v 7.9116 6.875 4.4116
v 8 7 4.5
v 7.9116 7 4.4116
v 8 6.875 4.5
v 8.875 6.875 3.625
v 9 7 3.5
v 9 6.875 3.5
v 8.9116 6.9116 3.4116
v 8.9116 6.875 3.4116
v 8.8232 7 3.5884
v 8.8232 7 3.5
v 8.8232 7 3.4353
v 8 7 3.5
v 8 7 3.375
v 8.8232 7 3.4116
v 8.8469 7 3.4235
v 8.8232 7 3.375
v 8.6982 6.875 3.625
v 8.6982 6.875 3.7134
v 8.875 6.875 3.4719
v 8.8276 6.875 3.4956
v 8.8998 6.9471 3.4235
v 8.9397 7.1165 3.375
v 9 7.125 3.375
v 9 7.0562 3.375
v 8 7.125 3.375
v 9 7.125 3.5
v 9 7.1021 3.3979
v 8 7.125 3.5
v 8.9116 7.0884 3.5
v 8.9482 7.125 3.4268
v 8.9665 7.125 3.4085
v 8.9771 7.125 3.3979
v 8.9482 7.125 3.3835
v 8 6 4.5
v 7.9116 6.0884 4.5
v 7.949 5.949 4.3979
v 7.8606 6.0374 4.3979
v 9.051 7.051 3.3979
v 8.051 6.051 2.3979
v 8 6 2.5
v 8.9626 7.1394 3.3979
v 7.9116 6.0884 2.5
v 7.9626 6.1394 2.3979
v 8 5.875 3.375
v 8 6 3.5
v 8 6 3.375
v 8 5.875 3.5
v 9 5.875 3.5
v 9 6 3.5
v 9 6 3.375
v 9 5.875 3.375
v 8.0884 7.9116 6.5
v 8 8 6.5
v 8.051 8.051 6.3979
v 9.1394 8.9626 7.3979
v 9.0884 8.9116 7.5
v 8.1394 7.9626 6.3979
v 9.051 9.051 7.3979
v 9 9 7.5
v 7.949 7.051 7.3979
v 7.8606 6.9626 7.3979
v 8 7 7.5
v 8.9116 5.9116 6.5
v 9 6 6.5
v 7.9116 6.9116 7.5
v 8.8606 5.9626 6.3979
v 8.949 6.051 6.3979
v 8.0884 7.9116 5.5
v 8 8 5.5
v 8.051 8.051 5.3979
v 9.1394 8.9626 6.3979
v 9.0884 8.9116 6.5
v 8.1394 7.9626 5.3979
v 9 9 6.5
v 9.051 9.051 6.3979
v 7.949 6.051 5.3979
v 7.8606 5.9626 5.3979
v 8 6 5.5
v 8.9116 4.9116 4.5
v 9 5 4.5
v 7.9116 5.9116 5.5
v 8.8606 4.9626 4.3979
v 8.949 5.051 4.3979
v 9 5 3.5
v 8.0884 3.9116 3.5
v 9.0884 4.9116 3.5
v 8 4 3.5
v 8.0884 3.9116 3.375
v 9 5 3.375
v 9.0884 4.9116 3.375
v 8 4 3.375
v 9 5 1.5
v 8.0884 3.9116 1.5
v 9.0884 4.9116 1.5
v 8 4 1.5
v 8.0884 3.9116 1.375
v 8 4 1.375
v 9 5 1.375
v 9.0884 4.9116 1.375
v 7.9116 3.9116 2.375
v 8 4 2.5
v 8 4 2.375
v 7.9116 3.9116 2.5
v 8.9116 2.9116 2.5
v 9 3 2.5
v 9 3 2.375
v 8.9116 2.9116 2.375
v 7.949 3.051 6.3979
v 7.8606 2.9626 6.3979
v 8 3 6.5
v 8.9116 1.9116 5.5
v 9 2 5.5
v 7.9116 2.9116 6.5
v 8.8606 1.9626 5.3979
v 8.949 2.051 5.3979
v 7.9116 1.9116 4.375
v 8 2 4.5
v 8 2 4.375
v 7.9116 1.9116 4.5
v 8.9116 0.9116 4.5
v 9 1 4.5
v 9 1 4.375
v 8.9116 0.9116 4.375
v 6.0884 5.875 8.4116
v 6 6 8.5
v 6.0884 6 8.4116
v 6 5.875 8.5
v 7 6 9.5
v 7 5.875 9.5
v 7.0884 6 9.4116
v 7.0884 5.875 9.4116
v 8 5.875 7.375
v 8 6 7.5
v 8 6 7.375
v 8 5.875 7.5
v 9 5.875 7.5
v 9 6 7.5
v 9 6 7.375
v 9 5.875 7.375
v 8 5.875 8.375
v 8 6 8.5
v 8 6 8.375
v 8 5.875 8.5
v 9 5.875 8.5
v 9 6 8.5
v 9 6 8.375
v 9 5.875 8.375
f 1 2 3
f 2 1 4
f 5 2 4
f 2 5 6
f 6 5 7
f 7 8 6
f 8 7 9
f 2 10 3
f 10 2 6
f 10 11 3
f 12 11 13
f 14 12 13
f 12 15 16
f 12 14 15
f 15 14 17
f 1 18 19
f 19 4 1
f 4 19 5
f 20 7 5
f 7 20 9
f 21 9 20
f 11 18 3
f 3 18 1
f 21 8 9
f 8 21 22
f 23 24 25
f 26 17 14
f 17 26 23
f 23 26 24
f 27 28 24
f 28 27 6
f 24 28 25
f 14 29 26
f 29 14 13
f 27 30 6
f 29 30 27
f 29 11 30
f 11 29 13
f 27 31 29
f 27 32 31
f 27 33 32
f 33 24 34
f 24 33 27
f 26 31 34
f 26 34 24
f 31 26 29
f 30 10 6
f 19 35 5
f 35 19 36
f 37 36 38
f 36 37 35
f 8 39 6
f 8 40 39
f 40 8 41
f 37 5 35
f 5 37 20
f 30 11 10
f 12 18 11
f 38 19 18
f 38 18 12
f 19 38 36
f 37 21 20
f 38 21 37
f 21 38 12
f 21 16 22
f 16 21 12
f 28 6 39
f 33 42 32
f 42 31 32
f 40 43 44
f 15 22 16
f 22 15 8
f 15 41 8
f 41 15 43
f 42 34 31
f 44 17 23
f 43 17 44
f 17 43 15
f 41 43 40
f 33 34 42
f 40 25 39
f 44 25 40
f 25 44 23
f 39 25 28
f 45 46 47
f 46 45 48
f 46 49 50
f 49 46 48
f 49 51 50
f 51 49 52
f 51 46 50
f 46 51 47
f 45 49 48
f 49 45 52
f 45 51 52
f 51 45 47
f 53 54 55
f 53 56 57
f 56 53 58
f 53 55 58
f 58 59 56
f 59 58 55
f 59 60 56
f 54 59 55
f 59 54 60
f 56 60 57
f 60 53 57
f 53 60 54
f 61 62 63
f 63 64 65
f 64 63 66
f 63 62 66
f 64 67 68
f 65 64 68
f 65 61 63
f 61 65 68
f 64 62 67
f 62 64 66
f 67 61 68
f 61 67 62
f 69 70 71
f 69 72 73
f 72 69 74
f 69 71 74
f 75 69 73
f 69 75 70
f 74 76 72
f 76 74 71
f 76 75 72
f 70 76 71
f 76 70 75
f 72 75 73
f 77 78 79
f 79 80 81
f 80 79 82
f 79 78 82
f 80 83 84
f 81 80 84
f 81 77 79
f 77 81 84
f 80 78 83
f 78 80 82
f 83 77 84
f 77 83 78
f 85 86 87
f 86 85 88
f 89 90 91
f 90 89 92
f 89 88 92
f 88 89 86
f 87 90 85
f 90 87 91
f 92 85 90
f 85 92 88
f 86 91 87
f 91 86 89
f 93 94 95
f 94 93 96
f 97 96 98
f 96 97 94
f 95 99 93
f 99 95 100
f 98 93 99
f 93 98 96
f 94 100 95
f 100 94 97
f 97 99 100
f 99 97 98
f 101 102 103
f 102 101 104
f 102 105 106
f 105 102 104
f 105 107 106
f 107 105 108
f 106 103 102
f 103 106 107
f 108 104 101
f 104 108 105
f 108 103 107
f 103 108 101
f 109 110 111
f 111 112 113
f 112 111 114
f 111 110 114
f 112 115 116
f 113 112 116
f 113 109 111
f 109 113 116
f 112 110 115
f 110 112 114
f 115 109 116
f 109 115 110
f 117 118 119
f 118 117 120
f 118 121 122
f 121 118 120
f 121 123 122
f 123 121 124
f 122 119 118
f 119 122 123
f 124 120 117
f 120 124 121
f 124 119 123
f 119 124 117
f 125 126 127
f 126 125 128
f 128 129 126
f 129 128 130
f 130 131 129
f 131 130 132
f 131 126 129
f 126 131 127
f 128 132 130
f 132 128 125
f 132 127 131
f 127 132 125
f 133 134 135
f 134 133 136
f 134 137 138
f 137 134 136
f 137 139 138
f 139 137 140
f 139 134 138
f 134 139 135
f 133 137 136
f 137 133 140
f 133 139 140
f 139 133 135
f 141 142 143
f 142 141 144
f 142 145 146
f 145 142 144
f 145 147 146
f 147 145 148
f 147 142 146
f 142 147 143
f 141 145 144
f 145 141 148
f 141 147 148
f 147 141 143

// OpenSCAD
translate(v = [-0.5, -0.5, 0]) {
	/*Shell 0*/
	union() {
		%/*Nodes shell 0*/
		union();
		/*Edges shell 0*/
		union();
	}
	/*Shell 1*/
	union() {
		%/*Nodes shell 1*/
		union();
		/*Edges shell 1*/
		union();
	}
	/*Shell 2*/
	union() {
		%/*Nodes shell 2*/
		union();
		/*Edges shell 2*/
		union();
	}
	/*Shell 3*/
	union() {
		%/*Nodes shell 3*/
		union();
		/*Edges shell 3*/
		union();
	}
	/*Shell 4*/
	union() {
		%/*Nodes shell 4*/
		union();
		/*Edges shell 4*/
		union();
	}
	/*Shell 5*/
	union() {
		%/*Nodes shell 5*/
		union() {
			/*Node thing.chamber[0].thingy.v1*/
			color(alpha = 0.1, c = "black") {
				translate(v = [1, -3, 6]) {
					cube(size = [1, 1, 1]);
				}
			}
			/*Node thing.chamber[0].thingy.v10*/
			color(alpha = 0.1, c = "black") {
				translate(v = [2, -3, 6]) {
					cube(size = [1, 1, 1]);
				}
			}
			/*Node thing.chamber[0].thingy.v11*/
			color(alpha = 0.1, c = "black") {
				translate(v = [4, -3, 6]) {
					cube(size = [1, 1, 1]);
				}
			}
			/*Node thing.chamber[0].thingy.v2*/
			color(alpha = 0.1, c = "black") {
				translate(v = [4, -2, 6]) {
					cube(size = [1, 1, 1]);
				}
			}
			/*Node thing.chamber[0].thingy.v3*/
			color(alpha = 0.1, c = "black") {
				translate(v = [0, -3, 6]) {
					cube(size = [1, 1, 1]);
				}
			}
			/*Node thing.chamber[0].thingy.v5*/
			color(alpha = 0.1, c = "black") {
				translate(v = [-1, -3, 6]) {
					cube(size = [1, 1, 1]);
				}
			}
			/*Node thing.chamber[0].thingy.v7*/
			color(alpha = 0.1, c = "black") {
				translate(v = [3, -2, 6]) {
					cube(size = [1, 1, 1]);
				}
			}
			/*Node thing.chamber[0].thingy.v9*/
			color(alpha = 0.1, c = "black") {
				translate(v = [-2, -3, 6]) {
					cube(size = [1, 1, 1]);
				}
			}
			/*Node thing.chamber[1].thingy.v1*/
			color(alpha = 0.1, c = "black") {
				translate(v = [0, -4, 6]) {
					cube(size = [1, 1, 1]);
				}
			}
			/*Node thing.chamber[1].thingy.v11*/
			color(alpha = 0.1, c = "black") {
				translate(v = [3, -3, 6]) {
					cube(size = [1, 1, 1]);
				}
			}
			/*Node thing.chamber[2].thingy.v1*/
			color(alpha = 0.1, c = "black") {
				translate(v = [0, -6, 4]) {
					cube(size = [1, 1, 1]);
				}
			}
			/*Node thing.chamber[2].thingy.v11*/
			color(alpha = 0.1, c = "black") {
				translate(v = [5, -4, 6]) {
					cube(size = [1, 1, 1]);
				}
			}
			/*Node thing.chamber[3].thingy.v1*/
			color(alpha = 0.1, c = "black") {
				translate(v = [1, -4, 6]) {
					cube(size = [1, 1, 1]);
				}
			}
			/*Node thing.chamber[3].thingy.v11*/
			color(alpha = 0.1, c = "black") {
				translate(v = [3, -5, 6]) {
					cube(size = [1, 1, 1]);
				}
			}
			/*Node thing.chamber[3].thingy.v5*/
			color(alpha = 0.1, c = "black") {
				translate(v = [-2, -6, 6]) {
					cube(size = [1, 1, 1]);
				}
			}
			/*Node thing.chamber[3].thingy.v7*/
			color(alpha = 0.1, c = "black") {
				translate(v = [4, -4, 6]) {
					cube(size = [1, 1, 1]);
				}
			}
			/*Node thing.chamber[3].thingy.v9*/
			color(alpha = 0.1, c = "black") {
				translate(v = [6, -6, 6]) {
					cube(size = [1, 1, 1]);
				}
			}
			/*Node $_22__5*/
			color(alpha = 0.1, c = "lightblue") {
				translate(v = [6, -3, 6]) {
					cube(size = [1, 1, 1]);
				}
			}
			/*Node $_16__5*/
			color(alpha = 0.1, c = "lightblue") {
				translate(v = [3, -6, 4]) {
					cube(size = [1, 1, 1]);
				}
			}
			/*Node $_9__5*/
			color(alpha = 0.1, c = "lightblue") {
				translate(v = [5, -2, 6]) {
					cube(size = [1, 1, 1]);
				}
			}
			/*Node $_26__5*/
			color(alpha = 0.1, c = "lightblue") {
				translate(v = [6, -5, 6]) {
					cube(size = [1, 1, 1]);
				}
			}
			/*Node $_3__5*/
			color(alpha = 0.1, c = "lightblue") {
				translate(v = [-1, -4, 6]) {
					cube(size = [1, 1, 1]);
				}
			}
			/*Node $_17__5*/
			color(alpha = 0.1, c = "lightblue") {
				translate(v = [3, -4, 6]) {
					cube(size = [1, 1, 1]);
				}
			}
			/*Node $_84__5*/
			color(alpha = 0.1, c = "lightblue") {
				translate(v = [6, -2, 6]) {
					cube(size = [1, 1, 1]);
				}
			}
			/*Node $_5__5*/
			color(alpha = 0.1, c = "lightblue") {
				translate(v = [2, -6, 6]) {
					cube(size = [1, 1, 1]);
				}
			}
			/*Node $_8__5*/
			color(alpha = 0.1, c = "lightblue") {
				translate(v = [5, -3, 6]) {
					cube(size = [1, 1, 1]);
				}
			}
			/*Node $_83__5*/
			color(alpha = 0.1, c = "lightblue") {
				translate(v = [0, -5, 6]) {
					cube(size = [1, 1, 1]);
				}
			}
			/*Node $_12__5*/
			color(alpha = 0.1, c = "lightblue") {
				translate(v = [1, -2, 6]) {
					cube(size = [1, 1, 1]);
				}
			}
			/*Node $_2__5*/
			color(alpha = 0.1, c = "lightblue") {
				translate(v = [6, -5, 4]) {
					cube(size = [1, 1, 1]);
				}
			}
			/*Node $_57__5*/
			color(alpha = 0.1, c = "lightblue") {
				translate(v = [1, -6, 6]) {
					cube(size = [1, 1, 1]);
				}
			}
			/*Node $_139__5*/
			color(alpha = 0.1, c = "lightblue") {
				translate(v = [6, -5, 5]) {
					cube(size = [1, 1, 1]);
				}
			}
			/*Node $_18__5*/
			color(alpha = 0.1, c = "lightblue") {
				translate(v = [6, -4, 6]) {
					cube(size = [1, 1, 1]);
				}
			}
			/*Node $_110__5*/
			color(alpha = 0.1, c = "lightblue") {
				translate(v = [2, -4, 6]) {
					cube(size = [1, 1, 1]);
				}
			}
			/*Node $_4__5*/
			color(alpha = 0.1, c = "lightblue") {
				translate(v = [6, -6, 4]) {
					cube(size = [1, 1, 1]);
				}
			}
			/*Node $_109__5*/
			color(alpha = 0.1, c = "lightblue") {
				translate(v = [2, -5, 6]) {
					cube(size = [1, 1, 1]);
				}
			}
			/*Node $_58__5*/
			color(alpha = 0.1, c = "lightblue") {
				translate(v = [2, -2, 6]) {
					cube(size = [1, 1, 1]);
				}
			}
			/*Node $_7__5*/
			color(alpha = 0.1, c = "lightblue") {
				translate(v = [6, -1, 4]) {
					cube(size = [1, 1, 1]);
				}
			}
			/*Node $_19__5*/
			color(alpha = 0.1, c = "lightblue") {
				translate(v = [3, -6, 6]) {
					cube(size = [1, 1, 1]);
				}
			}
			/*Node $_140__5*/
			color(alpha = 0.1, c = "lightblue") {
				translate(v = [4, -6, 6]) {
					cube(size = [1, 1, 1]);
				}
			}
		}
		/*Edges shell 5*/
		union();
	}
	/*Shell 6*/
	union() {
		%/*Nodes shell 6*/
		union();
		/*Edges shell 6*/
		union();
	}
	/*Shell 7*/
	union() {
		%/*Nodes shell 7*/
		union() {
			/*Node thing.chamber[0].thingy.v12*/
			color(alpha = 0.1, c = "black") {
				translate(v = [8, 7, 4]) {
					cube(size = [1, 1, 1]);
				}
			}
			/*Node thing.chamber[0].thingy.v13*/
			color(alpha = 0.1, c = "black") {
				translate(v = [8, 6, 3]) {
					cube(size = [1, 1, 1]);
				}
			}
			/*Node thing.chamber[0].thingy.v4*/
			color(alpha = 0.1, c = "black") {
				translate(v = [8, 8, 6]) {
					cube(size = [1, 1, 1]);
				}
			}
			/*Node thing.chamber[0].thingy.v6*/
			color(alpha = 0.1, c = "black") {
				translate(v = [8, 7, 7]) {
					cube(size = [1, 1, 1]);
				}
			}
			/*Node thing.chamber[0].thingy.v8*/
			color(alpha = 0.1, c = "black") {
				translate(v = [8, 8, 5]) {
					cube(size = [1, 1, 1]);
				}
			}
			/*Node thing.chamber[1].thingy.v12*/
			color(alpha = 0.1, c = "black") {
				translate(v = [8, 7, 3]) {
					cube(size = [1, 1, 1]);
				}
			}
			/*Node thing.chamber[1].thingy.v13*/
			color(alpha = 0.1, c = "black") {
				translate(v = [8, 6, 5]) {
					cube(size = [1, 1, 1]);
				}
			}
			/*Node thing.chamber[2].thingy.v12*/
			color(alpha = 0.1, c = "black") {
				translate(v = [8, 6, 4]) {
					cube(size = [1, 1, 1]);
				}
			}
			/*Node thing.chamber[2].thingy.v13*/
			color(alpha = 0.1, c = "black") {
				translate(v = [8, 4, 3]) {
					cube(size = [1, 1, 1]);
				}
			}
			/*Node thing.chamber[3].thingy.v12*/
			color(alpha = 0.1, c = "black") {
				translate(v = [8, 6, 2]) {
					cube(size = [1, 1, 1]);
				}
			}
			/*Node thing.chamber[3].thingy.v13*/
			color(alpha = 0.1, c = "black") {
				translate(v = [8, 4, 1]) {
					cube(size = [1, 1, 1]);
				}
			}
			/*Node thing.dead_bead*/
			color(alpha = 0.1, c = "black") {
				translate(v = [8, 4, 2]) {
					cube(size = [1, 1, 1]);
				}
			}
			/*Node thing.dead_buffer*/
			color(alpha = 0.1, c = "black") {
				translate(v = [8, 3, 6]) {
					cube(size = [1, 1, 1]);
				}
			}
			/*Node thing.dead_cell*/
			color(alpha = 0.1, c = "black") {
				translate(v = [8, 2, 4]) {
					cube(size = [1, 1, 1]);
				}
			}
			/*Node thing.elute*/
			color(alpha = 0.1, c = "black") {
				translate(v = [6, 6, 8]) {
					cube(size = [1, 1, 1]);
				}
			}
			/*Node thing.lysis*/
			color(alpha = 0.1, c = "black") {
				translate(v = [8, 6, 7]) {
					cube(size = [1, 1, 1]);
				}
			}
			/*Node thing.wash*/
			color(alpha = 0.1, c = "black") {
				translate(v = [8, 6, 8]) {
					cube(size = [1, 1, 1]);
				}
			}
		}
		/*Edges shell 7*/
		union() {
			/*Edge 40 from thing.chamber[0].thingy.v12 to $_40*/
			translate(v = [9.5, 7.5, 3.5]) {
				rotate(a = [0, 45.00000000000001, 180.0]) {
					cube(size = [0.125, 0.125, 1.4142135623730951]);
				}
			}
			/*Edge 40 from $_40 to thing.chamber[1].thingy.v12*/
			translate(v = [8.5, 7.5, 3.5]) {
				rotate(a = [0, 90.0, 0.0]) {
					cube(size = [0.125, 0.125, 1.0]);
				}
			}
			/*Edge 40 from $_40 to thing.chamber[2].thingy.v12*/
			translate(v = [8.5, 6.5, 4.5]) {
				rotate(a = [0, 125.26438968275465, 45.0]) {
					cube(size = [0.125, 0.125, 1.7320508075688772]);
				}
			}
			/*Edge 40 from $_40 to thing.chamber[3].thingy.v12*/
			translate(v = [8.5, 6.5, 2.5]) {
				rotate(a = [0, 54.735610317245346, 45.0]) {
					cube(size = [0.125, 0.125, 1.7320508075688772]);
				}
			}
			/*Edge 36 from thing.chamber[0].thingy.v13 to $_36*/
			translate(v = [9.5, 6.5, 3.5]) {
				rotate(a = [0, 90.0, 180.0]) {
					cube(size = [0.125, 0.125, 1.0]);
				}
			}
			/*Edge 31 from thing.chamber[0].thingy.v4 to $_31*/
			translate(v = [9.5, 9.5, 7.5]) {
				rotate(a = [0, 125.26438968275465, -135.0]) {
					cube(size = [0.125, 0.125, 1.7320508075688772]);
				}
			}
			/*Edge 32 from thing.chamber[0].thingy.v6 to $_32*/
			translate(v = [9.5, 6.5, 6.5]) {
				rotate(a = [0, 54.735610317245346, 135.0]) {
					cube(size = [0.125, 0.125, 1.7320508075688772]);
				}
			}
			/*Edge 30 from thing.chamber[0].thingy.v8 to $_30*/
			translate(v = [9.5, 9.5, 6.5]) {
				rotate(a = [0, 125.26438968275465, -135.0]) {
					cube(size = [0.125, 0.125, 1.7320508075688772]);
				}
			}
			/*Edge 37 from thing.chamber[1].thingy.v13 to $_37*/
			translate(v = [9.5, 5.5, 4.5]) {
				rotate(a = [0, 54.735610317245346, 135.0]) {
					cube(size = [0.125, 0.125, 1.7320508075688772]);
				}
			}
			/*Edge 38 from thing.chamber[2].thingy.v13 to $_38*/
			translate(v = [9.5, 5.5, 3.5]) {
				rotate(a = [0, 90.0, -135.0]) {
					cube(size = [0.125, 0.125, 1.4142135623730951]);
				}
			}
			/*Edge 39 from thing.chamber[3].thingy.v13 to $_39*/
			translate(v = [9.5, 5.5, 1.5]) {
				rotate(a = [0, 90.0, -135.0]) {
					cube(size = [0.125, 0.125, 1.4142135623730951]);
				}
			}
			/*Edge 41 from thing.dead_bead to $_41*/
			translate(v = [9.5, 3.5, 2.5]) {
				rotate(a = [0, 90.0, 135.0]) {
					cube(size = [0.125, 0.125, 1.4142135623730951]);
				}
			}
			/*Edge 42 from thing.dead_buffer to $_42*/
			translate(v = [9.5, 2.5, 5.5]) {
				rotate(a = [0, 54.735610317245346, 135.0]) {
					cube(size = [0.125, 0.125, 1.7320508075688772]);
				}
			}
			/*Edge 43 from thing.dead_cell to $_43*/
			translate(v = [9.5, 1.5, 4.5]) {
				rotate(a = [0, 90.0, 135.0]) {
					cube(size = [0.125, 0.125, 1.4142135623730951]);
				}
			}
			/*Edge 35 from thing.elute to $_35*/
			translate(v = [7.5, 6.5, 9.5]) {
				rotate(a = [0, 135.0, 180.0]) {
					cube(size = [0.125, 0.125, 1.4142135623730951]);
				}
			}
			/*Edge 33 from thing.lysis to $_33*/
			translate(v = [9.5, 6.5, 7.5]) {
				rotate(a = [0, 90.0, 180.0]) {
					cube(size = [0.125, 0.125, 1.0]);
				}
			}
			/*Edge 34 from thing.wash to $_34*/
			translate(v = [9.5, 6.5, 8.5]) {
				rotate(a = [0, 90.0, 180.0]) {
					cube(size = [0.125, 0.125, 1.0]);
				}
			}
		}
	}
	/*Shell 8*/
	union() {
		%/*Nodes shell 8*/
		union() {
			/*Node $_40*/
			color(alpha = 0.1, c = "pink") {
				translate(v = [9, 7, 3]) {
					cube(size = [1, 1, 1]);
				}
			}
			/*Node $_36*/
			color(alpha = 0.1, c = "pink") {
				translate(v = [9, 6, 3]) {
					cube(size = [1, 1, 1]);
				}
			}
			/*Node $_31*/
			color(alpha = 0.1, c = "pink") {
				translate(v = [9, 9, 7]) {
					cube(size = [1, 1, 1]);
				}
			}
			/*Node $_32*/
			color(alpha = 0.1, c = "pink") {
				translate(v = [9, 6, 6]) {
					cube(size = [1, 1, 1]);
				}
			}
			/*Node $_30*/
			color(alpha = 0.1, c = "pink") {
				translate(v = [9, 9, 6]) {
					cube(size = [1, 1, 1]);
				}
			}
			/*Node $_37*/
			color(alpha = 0.1, c = "pink") {
				translate(v = [9, 5, 4]) {
					cube(size = [1, 1, 1]);
				}
			}
			/*Node $_38*/
			color(alpha = 0.1, c = "pink") {
				translate(v = [9, 5, 3]) {
					cube(size = [1, 1, 1]);
				}
			}
			/*Node $_39*/
			color(alpha = 0.1, c = "pink") {
				translate(v = [9, 5, 1]) {
					cube(size = [1, 1, 1]);
				}
			}
			/*Node $_41*/
			color(alpha = 0.1, c = "pink") {
				translate(v = [9, 3, 2]) {
					cube(size = [1, 1, 1]);
				}
			}
			/*Node $_42*/
			color(alpha = 0.1, c = "pink") {
				translate(v = [9, 2, 5]) {
					cube(size = [1, 1, 1]);
				}
			}
			/*Node $_43*/
			color(alpha = 0.1, c = "pink") {
				translate(v = [9, 1, 4]) {
					cube(size = [1, 1, 1]);
				}
			}
			/*Node $_35*/
			color(alpha = 0.1, c = "pink") {
				translate(v = [7, 6, 9]) {
					cube(size = [1, 1, 1]);
				}
			}
			/*Node $_33*/
			color(alpha = 0.1, c = "pink") {
				translate(v = [9, 6, 7]) {
					cube(size = [1, 1, 1]);
				}
			}
			/*Node $_34*/
			color(alpha = 0.1, c = "pink") {
				translate(v = [9, 6, 8]) {
					cube(size = [1, 1, 1]);
				}
			}
		}
		/*Edges shell 8*/
		union();
	}
}
